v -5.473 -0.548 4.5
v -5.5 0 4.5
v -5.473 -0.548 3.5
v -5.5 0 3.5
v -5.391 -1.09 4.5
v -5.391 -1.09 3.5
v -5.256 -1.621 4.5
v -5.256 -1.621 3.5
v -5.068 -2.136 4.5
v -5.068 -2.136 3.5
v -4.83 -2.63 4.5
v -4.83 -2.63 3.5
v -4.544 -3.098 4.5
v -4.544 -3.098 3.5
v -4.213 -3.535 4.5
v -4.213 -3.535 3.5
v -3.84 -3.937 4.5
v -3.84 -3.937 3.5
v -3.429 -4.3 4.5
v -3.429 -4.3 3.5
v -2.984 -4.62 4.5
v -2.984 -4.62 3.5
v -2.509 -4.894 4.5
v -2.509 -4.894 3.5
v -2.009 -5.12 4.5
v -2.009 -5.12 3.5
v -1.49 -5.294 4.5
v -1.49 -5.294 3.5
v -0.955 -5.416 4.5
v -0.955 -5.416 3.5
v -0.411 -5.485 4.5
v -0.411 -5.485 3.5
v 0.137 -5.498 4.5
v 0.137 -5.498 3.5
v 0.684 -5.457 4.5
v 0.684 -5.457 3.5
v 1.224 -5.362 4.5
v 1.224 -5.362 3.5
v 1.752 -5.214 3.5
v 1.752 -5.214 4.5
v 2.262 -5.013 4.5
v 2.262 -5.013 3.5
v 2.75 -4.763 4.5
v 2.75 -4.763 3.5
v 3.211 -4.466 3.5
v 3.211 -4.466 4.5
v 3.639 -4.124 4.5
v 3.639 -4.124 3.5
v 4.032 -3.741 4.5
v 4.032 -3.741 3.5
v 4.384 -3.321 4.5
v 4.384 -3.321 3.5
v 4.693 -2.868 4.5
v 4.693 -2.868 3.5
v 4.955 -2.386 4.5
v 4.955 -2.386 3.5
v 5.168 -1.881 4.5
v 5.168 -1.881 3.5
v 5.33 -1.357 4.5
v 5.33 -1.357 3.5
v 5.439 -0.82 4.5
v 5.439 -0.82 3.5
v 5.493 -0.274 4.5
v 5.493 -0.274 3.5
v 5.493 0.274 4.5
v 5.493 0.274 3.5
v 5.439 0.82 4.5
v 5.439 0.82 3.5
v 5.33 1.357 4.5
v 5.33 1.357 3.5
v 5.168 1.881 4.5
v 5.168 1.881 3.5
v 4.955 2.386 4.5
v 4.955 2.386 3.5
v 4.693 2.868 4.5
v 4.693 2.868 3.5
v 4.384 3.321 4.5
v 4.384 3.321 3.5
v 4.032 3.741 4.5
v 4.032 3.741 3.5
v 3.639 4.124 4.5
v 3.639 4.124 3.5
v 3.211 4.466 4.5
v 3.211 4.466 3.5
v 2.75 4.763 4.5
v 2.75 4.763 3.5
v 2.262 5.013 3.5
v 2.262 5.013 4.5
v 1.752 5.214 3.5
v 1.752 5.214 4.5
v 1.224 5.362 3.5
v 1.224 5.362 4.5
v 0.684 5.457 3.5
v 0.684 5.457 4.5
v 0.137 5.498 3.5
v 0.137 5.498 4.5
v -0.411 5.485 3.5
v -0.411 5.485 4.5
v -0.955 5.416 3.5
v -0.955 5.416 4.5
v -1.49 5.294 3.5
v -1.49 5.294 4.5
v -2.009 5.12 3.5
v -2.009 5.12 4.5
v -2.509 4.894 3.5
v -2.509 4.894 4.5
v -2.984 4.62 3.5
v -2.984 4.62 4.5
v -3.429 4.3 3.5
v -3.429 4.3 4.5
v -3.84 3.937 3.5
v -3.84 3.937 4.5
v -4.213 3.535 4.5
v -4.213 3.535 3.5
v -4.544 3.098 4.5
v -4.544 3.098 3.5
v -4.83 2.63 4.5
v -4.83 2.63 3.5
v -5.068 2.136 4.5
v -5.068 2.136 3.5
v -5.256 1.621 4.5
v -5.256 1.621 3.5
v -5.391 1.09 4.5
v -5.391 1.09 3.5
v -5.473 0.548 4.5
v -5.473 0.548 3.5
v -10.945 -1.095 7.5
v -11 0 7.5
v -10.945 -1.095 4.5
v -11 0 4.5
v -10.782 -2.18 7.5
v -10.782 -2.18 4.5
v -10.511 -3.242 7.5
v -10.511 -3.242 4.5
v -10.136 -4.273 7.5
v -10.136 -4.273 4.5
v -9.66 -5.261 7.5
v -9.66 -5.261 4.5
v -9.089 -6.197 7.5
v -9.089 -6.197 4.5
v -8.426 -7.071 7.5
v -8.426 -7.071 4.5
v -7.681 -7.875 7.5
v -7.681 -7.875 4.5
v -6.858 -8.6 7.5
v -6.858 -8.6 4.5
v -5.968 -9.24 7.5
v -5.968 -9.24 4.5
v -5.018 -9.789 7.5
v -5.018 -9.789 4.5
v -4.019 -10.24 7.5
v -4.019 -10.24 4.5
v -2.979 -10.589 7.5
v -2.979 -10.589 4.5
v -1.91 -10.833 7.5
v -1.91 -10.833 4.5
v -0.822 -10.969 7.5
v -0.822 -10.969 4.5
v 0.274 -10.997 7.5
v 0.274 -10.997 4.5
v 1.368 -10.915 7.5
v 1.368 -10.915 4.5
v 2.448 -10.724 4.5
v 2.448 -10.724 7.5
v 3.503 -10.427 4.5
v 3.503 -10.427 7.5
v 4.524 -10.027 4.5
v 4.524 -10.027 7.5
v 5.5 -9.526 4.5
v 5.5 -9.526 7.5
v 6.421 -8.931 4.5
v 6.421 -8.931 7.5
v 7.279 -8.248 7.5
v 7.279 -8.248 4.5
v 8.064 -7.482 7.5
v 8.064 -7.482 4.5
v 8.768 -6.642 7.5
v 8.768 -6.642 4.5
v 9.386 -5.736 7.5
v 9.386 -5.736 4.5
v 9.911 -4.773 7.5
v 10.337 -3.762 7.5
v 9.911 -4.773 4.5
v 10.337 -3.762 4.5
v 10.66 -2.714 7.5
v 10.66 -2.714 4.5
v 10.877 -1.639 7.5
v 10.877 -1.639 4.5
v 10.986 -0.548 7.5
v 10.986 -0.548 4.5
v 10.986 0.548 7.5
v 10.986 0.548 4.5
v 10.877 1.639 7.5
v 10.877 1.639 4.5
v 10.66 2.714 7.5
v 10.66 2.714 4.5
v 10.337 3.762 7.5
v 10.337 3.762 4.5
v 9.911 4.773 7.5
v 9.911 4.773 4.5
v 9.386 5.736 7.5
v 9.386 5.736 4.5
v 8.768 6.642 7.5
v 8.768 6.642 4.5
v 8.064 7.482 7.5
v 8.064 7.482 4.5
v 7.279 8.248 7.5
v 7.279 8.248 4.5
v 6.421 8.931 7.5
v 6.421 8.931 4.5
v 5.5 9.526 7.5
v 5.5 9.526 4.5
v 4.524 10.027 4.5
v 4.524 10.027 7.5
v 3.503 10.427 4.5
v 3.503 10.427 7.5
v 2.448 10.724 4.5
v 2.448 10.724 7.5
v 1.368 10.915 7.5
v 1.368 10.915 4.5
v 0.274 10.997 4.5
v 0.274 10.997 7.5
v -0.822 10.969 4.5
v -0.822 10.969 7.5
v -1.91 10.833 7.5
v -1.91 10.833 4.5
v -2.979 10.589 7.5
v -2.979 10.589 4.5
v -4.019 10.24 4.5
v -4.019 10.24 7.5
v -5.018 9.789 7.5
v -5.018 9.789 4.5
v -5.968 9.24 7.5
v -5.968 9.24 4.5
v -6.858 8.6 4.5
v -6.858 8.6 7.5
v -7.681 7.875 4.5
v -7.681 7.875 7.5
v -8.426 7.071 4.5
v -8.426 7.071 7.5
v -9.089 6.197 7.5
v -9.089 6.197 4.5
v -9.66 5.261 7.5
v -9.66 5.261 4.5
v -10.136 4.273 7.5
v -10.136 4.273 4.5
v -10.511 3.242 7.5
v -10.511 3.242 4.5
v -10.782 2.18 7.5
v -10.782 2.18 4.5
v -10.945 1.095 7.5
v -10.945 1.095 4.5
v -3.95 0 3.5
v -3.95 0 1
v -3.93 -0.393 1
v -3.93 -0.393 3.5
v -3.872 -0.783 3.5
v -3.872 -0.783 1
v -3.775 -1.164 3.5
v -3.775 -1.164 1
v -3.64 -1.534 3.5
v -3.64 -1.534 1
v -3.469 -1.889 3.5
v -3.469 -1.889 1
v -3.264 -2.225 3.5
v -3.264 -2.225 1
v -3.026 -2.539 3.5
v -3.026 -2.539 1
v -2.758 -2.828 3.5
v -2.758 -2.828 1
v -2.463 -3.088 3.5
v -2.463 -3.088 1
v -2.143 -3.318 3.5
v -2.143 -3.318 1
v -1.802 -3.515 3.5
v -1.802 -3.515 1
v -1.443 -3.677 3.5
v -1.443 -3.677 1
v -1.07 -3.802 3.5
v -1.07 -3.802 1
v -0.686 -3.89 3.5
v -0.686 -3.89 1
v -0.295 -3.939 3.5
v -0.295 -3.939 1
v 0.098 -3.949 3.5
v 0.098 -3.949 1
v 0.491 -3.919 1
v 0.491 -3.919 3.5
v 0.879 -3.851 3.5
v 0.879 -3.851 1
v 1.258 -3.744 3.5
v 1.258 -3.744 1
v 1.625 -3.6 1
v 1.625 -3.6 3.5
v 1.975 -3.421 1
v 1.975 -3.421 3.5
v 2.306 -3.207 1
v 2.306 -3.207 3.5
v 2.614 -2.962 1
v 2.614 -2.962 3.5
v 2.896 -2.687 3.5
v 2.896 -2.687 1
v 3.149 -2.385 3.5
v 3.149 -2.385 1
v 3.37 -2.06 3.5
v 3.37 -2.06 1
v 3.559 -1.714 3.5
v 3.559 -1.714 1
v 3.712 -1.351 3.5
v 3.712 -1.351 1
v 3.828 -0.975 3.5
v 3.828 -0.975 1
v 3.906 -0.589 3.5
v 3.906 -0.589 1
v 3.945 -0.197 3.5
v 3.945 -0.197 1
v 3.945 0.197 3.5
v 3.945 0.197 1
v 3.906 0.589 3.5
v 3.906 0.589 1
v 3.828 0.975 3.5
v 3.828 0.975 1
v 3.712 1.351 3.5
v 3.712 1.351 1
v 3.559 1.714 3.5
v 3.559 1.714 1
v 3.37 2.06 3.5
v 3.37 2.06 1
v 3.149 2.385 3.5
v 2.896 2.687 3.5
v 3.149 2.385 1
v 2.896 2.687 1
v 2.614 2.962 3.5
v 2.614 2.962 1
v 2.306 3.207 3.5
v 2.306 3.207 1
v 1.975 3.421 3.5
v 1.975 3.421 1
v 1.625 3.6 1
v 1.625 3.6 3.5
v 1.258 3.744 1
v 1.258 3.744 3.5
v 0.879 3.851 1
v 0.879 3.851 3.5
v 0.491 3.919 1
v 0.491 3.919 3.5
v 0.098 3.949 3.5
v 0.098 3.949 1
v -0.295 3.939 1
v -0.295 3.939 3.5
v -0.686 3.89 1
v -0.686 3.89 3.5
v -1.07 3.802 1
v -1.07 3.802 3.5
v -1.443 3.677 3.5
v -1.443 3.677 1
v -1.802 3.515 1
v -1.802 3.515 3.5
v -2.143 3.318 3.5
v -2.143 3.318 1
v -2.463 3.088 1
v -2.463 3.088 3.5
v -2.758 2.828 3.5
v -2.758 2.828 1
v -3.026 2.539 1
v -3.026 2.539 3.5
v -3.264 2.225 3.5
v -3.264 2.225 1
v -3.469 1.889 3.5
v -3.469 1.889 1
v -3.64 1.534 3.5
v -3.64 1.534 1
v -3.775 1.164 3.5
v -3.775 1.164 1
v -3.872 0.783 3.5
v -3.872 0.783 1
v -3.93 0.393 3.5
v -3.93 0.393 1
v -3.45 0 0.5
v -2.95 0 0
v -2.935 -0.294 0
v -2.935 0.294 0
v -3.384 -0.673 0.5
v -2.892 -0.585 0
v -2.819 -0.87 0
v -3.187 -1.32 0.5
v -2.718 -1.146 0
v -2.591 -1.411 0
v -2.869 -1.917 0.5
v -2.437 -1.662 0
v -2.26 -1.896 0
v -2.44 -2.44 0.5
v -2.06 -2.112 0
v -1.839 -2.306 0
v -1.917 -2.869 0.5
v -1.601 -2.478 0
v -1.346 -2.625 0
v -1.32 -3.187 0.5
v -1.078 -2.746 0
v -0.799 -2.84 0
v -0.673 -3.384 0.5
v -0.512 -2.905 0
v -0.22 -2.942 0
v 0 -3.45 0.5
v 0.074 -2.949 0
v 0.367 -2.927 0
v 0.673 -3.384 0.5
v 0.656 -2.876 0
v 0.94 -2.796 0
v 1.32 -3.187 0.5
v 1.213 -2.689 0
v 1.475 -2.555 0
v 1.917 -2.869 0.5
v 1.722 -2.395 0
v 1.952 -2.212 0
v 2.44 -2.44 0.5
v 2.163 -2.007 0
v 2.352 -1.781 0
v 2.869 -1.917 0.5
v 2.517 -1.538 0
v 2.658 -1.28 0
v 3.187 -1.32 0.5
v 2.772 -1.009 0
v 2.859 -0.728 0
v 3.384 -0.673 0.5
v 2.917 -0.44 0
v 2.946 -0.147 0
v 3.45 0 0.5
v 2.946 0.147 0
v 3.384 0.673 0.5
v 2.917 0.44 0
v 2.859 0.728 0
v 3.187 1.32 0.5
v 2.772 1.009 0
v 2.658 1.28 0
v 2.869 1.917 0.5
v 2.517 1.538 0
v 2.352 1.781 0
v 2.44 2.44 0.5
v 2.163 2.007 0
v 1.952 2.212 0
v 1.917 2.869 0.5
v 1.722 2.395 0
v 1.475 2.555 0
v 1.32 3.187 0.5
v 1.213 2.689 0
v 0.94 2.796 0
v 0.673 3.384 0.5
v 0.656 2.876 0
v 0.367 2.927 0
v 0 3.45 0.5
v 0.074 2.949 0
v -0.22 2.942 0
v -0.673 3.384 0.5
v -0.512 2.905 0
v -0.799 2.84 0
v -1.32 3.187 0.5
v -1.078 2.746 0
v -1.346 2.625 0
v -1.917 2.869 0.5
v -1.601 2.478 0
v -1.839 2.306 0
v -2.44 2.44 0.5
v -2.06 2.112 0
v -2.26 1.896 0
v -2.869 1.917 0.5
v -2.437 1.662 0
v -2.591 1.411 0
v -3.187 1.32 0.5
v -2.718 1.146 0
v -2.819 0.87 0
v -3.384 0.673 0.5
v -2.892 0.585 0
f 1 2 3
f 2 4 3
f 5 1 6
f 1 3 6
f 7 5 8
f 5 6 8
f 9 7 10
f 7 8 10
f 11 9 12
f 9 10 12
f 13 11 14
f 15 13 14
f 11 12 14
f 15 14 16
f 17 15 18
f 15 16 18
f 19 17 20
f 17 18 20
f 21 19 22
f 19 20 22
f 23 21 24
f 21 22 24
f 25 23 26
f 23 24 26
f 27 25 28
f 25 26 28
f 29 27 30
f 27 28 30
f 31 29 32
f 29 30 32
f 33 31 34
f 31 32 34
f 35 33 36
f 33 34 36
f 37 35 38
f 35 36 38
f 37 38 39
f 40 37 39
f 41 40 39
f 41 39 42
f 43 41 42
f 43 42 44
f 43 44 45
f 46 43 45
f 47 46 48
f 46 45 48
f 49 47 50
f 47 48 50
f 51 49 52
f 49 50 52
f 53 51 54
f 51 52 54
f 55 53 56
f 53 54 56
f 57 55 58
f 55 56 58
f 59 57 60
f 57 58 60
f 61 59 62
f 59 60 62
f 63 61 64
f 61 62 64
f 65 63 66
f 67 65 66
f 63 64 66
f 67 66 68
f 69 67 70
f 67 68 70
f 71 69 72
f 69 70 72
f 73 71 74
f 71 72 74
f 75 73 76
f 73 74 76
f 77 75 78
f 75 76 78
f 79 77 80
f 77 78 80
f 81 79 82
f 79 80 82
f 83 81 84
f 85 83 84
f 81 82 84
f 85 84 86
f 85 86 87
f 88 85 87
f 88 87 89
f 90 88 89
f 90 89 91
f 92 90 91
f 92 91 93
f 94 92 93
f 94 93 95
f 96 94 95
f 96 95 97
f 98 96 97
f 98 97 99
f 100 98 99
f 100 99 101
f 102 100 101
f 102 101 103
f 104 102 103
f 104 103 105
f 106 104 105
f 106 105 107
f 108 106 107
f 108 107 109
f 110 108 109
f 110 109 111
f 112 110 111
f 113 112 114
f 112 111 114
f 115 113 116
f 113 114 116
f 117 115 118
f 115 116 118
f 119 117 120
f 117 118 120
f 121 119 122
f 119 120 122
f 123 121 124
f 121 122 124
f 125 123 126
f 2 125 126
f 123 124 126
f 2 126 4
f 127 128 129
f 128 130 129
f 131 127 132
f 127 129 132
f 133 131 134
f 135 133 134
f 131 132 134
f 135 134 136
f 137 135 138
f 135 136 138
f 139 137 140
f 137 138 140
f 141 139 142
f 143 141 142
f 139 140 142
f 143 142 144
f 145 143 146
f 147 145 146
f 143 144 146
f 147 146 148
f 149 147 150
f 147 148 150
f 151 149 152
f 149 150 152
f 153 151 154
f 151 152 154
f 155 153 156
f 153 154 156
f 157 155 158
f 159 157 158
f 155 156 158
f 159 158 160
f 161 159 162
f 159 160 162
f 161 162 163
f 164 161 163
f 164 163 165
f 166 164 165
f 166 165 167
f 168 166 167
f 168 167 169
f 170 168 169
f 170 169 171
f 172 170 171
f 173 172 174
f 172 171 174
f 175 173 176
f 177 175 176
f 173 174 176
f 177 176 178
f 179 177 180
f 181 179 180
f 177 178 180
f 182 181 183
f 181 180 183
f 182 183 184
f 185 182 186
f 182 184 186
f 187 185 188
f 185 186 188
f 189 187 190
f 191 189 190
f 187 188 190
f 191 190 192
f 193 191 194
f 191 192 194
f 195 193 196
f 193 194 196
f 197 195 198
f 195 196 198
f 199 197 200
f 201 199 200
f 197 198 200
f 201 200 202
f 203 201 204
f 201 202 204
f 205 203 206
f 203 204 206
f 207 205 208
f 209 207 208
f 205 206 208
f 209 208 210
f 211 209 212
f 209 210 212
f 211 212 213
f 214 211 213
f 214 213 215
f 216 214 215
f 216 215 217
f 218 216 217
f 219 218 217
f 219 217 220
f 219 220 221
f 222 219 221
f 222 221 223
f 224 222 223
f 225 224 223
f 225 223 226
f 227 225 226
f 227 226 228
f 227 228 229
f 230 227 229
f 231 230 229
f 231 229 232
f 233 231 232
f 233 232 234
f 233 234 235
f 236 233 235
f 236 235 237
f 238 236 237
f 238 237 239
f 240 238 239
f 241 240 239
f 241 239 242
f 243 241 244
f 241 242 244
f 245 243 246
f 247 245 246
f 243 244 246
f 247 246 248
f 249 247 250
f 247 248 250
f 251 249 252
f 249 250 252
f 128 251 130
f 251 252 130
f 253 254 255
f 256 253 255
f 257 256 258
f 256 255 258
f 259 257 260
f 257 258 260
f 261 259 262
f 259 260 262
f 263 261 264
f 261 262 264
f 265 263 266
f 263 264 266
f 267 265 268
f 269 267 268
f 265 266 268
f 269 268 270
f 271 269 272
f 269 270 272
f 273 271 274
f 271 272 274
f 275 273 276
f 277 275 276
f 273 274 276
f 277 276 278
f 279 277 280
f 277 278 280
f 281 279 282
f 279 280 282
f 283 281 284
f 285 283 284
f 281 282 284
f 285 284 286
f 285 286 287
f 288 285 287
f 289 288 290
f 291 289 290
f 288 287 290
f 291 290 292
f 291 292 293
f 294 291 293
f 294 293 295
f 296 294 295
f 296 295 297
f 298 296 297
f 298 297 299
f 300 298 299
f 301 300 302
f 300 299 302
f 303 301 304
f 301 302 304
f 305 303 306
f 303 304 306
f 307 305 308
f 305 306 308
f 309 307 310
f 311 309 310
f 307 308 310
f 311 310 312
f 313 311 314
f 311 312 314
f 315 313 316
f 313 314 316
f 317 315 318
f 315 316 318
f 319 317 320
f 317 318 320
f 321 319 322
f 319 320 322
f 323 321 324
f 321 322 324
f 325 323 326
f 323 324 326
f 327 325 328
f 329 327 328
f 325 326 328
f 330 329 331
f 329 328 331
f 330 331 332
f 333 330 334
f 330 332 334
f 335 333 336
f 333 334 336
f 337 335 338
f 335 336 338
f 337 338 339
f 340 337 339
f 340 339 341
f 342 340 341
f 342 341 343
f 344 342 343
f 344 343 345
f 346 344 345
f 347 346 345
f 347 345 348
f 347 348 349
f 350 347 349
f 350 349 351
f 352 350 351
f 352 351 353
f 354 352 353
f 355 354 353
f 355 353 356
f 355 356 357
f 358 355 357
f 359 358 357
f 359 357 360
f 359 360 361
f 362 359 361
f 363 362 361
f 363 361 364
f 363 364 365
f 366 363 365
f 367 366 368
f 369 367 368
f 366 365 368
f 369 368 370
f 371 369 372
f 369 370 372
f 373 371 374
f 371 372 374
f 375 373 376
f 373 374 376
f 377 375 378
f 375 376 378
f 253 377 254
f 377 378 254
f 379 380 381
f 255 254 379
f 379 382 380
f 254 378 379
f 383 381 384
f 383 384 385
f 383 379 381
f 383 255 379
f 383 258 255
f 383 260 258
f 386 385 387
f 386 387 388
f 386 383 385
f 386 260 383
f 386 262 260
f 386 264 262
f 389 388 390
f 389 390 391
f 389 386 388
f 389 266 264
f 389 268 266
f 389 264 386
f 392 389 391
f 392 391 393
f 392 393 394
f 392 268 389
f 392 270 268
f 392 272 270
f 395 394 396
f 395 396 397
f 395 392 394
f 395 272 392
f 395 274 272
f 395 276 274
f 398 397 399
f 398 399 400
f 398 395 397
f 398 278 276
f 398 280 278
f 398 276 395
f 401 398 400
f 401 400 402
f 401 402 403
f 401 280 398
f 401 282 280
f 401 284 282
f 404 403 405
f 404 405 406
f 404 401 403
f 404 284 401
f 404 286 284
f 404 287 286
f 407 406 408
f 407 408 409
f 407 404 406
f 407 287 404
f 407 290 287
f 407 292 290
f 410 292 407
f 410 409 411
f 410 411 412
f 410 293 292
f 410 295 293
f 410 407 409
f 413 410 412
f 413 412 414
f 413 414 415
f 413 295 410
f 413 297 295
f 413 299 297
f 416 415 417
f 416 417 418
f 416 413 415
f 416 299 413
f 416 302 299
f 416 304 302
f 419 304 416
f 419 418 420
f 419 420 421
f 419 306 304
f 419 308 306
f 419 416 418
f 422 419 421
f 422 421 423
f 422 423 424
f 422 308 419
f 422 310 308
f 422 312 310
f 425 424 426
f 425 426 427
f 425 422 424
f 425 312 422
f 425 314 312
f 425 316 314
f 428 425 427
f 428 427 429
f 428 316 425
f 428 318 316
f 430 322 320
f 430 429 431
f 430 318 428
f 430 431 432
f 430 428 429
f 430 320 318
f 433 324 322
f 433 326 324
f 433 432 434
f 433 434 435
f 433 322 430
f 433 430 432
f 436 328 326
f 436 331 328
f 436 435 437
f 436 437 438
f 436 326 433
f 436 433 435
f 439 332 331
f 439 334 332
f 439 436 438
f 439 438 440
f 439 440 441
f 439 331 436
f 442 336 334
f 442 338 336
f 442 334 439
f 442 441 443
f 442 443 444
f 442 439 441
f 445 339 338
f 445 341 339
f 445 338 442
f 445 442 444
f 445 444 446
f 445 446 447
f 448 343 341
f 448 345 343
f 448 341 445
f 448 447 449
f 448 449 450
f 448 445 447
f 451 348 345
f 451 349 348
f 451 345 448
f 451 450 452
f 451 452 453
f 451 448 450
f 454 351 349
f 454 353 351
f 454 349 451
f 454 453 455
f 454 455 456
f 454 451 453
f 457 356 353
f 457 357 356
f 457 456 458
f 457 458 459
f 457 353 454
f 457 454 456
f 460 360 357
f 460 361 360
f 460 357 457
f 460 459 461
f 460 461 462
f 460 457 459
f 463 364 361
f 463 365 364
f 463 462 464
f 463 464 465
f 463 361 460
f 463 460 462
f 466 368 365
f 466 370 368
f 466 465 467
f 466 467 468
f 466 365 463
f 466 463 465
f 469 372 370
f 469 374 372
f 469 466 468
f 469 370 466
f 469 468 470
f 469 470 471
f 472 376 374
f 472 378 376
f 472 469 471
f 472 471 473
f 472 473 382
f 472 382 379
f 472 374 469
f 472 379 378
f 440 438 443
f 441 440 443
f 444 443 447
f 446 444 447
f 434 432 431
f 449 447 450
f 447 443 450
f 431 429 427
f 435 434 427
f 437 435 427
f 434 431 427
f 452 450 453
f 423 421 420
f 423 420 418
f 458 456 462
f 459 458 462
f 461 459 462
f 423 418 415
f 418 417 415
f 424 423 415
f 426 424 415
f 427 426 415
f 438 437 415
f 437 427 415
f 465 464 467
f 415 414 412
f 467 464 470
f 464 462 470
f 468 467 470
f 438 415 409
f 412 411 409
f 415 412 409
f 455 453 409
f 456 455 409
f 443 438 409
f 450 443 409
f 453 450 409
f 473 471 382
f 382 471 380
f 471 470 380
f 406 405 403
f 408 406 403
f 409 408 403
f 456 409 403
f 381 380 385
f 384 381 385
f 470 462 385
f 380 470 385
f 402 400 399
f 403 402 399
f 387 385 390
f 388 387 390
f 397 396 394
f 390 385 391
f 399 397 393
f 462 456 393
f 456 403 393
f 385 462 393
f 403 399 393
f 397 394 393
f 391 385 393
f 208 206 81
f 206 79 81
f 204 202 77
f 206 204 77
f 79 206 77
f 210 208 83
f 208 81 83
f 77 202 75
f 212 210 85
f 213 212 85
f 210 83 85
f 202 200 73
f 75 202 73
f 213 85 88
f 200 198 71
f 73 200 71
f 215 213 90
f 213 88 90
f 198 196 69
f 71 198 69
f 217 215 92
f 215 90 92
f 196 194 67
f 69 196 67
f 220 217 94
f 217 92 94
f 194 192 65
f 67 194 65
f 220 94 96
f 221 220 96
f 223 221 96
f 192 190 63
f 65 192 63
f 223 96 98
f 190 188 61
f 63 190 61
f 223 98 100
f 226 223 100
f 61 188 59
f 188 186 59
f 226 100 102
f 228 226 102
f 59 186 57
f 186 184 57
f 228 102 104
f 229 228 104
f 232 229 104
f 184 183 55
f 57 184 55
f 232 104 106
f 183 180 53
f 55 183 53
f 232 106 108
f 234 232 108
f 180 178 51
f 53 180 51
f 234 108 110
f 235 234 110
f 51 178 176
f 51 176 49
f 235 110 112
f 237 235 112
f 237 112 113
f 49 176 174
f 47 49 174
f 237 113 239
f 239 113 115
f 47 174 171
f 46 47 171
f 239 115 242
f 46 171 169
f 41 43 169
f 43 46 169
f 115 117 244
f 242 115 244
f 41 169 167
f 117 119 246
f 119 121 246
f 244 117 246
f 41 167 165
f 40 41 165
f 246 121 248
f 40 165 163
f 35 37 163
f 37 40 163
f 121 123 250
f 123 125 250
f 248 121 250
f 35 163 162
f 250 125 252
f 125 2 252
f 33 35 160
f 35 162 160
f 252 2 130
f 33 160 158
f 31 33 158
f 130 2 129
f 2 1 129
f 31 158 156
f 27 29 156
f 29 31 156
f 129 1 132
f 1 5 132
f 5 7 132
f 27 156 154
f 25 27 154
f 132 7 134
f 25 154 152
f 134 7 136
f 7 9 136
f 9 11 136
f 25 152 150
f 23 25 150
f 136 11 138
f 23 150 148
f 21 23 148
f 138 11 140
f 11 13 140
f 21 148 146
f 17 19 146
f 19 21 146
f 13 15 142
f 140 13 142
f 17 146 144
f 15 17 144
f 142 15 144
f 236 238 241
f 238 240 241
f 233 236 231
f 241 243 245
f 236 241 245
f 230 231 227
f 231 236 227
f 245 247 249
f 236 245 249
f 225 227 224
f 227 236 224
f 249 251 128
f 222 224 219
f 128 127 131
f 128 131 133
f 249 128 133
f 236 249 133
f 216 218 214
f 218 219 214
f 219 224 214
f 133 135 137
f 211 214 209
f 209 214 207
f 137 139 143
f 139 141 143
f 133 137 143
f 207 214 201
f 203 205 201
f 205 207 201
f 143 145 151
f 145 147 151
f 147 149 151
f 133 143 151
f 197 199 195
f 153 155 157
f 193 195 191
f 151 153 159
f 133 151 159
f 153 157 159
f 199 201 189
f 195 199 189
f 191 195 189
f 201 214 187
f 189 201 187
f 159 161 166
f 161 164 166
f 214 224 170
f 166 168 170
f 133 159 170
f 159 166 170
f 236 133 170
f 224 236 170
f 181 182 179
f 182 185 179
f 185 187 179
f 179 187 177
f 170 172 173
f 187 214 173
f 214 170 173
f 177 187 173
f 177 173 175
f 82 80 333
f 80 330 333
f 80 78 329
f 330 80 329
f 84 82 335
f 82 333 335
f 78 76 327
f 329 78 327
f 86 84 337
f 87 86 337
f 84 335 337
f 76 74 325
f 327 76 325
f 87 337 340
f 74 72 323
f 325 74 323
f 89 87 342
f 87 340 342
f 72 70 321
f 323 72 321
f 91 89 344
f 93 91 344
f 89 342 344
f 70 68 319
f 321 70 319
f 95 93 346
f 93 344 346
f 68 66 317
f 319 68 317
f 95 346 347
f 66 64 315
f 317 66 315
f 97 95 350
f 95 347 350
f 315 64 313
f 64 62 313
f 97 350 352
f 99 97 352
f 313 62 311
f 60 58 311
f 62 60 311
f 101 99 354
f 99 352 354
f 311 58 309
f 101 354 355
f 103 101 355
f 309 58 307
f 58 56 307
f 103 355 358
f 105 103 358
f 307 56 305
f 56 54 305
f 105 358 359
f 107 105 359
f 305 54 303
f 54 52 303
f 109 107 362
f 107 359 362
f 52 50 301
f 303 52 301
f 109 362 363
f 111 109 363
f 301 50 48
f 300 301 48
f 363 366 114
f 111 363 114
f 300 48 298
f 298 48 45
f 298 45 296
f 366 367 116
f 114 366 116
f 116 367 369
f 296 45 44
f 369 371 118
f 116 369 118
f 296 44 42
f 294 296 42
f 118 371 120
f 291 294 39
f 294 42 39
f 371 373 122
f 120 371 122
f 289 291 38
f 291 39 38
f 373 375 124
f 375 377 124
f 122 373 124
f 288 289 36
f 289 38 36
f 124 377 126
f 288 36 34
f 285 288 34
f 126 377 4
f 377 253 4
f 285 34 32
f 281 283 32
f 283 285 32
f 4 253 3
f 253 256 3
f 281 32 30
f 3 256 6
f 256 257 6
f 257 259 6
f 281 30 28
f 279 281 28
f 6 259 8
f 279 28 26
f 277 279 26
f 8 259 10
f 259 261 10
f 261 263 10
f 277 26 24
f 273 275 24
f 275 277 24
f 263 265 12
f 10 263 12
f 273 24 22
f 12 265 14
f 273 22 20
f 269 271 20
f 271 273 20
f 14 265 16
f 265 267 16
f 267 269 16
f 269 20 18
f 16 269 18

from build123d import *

# Parameters (mm, degrees)
F2_SIZE = 1


with BuildPart() as f1:
    # F0 (on Front) → F1 (revolve)
    with BuildSketch(Plane.XZ):
        Polygon((-3.95, 0), (0, 0), (0, 7.5), (-11, 7.5), (-11, 4.5), (-5.5, 4.5), (-5.5, 3.5), (-3.95, 3.5), align=None)
    revolve(axis=Axis((0, 0, 3.75), (0, 0, 1)))

    # F2
    f2_edges = [f1.edges().sort_by_distance(p)[0] for p in [
        (3.95, 0, 0),
    ]]
    chamfer(f2_edges, length=F2_SIZE)


solid = f1.part
